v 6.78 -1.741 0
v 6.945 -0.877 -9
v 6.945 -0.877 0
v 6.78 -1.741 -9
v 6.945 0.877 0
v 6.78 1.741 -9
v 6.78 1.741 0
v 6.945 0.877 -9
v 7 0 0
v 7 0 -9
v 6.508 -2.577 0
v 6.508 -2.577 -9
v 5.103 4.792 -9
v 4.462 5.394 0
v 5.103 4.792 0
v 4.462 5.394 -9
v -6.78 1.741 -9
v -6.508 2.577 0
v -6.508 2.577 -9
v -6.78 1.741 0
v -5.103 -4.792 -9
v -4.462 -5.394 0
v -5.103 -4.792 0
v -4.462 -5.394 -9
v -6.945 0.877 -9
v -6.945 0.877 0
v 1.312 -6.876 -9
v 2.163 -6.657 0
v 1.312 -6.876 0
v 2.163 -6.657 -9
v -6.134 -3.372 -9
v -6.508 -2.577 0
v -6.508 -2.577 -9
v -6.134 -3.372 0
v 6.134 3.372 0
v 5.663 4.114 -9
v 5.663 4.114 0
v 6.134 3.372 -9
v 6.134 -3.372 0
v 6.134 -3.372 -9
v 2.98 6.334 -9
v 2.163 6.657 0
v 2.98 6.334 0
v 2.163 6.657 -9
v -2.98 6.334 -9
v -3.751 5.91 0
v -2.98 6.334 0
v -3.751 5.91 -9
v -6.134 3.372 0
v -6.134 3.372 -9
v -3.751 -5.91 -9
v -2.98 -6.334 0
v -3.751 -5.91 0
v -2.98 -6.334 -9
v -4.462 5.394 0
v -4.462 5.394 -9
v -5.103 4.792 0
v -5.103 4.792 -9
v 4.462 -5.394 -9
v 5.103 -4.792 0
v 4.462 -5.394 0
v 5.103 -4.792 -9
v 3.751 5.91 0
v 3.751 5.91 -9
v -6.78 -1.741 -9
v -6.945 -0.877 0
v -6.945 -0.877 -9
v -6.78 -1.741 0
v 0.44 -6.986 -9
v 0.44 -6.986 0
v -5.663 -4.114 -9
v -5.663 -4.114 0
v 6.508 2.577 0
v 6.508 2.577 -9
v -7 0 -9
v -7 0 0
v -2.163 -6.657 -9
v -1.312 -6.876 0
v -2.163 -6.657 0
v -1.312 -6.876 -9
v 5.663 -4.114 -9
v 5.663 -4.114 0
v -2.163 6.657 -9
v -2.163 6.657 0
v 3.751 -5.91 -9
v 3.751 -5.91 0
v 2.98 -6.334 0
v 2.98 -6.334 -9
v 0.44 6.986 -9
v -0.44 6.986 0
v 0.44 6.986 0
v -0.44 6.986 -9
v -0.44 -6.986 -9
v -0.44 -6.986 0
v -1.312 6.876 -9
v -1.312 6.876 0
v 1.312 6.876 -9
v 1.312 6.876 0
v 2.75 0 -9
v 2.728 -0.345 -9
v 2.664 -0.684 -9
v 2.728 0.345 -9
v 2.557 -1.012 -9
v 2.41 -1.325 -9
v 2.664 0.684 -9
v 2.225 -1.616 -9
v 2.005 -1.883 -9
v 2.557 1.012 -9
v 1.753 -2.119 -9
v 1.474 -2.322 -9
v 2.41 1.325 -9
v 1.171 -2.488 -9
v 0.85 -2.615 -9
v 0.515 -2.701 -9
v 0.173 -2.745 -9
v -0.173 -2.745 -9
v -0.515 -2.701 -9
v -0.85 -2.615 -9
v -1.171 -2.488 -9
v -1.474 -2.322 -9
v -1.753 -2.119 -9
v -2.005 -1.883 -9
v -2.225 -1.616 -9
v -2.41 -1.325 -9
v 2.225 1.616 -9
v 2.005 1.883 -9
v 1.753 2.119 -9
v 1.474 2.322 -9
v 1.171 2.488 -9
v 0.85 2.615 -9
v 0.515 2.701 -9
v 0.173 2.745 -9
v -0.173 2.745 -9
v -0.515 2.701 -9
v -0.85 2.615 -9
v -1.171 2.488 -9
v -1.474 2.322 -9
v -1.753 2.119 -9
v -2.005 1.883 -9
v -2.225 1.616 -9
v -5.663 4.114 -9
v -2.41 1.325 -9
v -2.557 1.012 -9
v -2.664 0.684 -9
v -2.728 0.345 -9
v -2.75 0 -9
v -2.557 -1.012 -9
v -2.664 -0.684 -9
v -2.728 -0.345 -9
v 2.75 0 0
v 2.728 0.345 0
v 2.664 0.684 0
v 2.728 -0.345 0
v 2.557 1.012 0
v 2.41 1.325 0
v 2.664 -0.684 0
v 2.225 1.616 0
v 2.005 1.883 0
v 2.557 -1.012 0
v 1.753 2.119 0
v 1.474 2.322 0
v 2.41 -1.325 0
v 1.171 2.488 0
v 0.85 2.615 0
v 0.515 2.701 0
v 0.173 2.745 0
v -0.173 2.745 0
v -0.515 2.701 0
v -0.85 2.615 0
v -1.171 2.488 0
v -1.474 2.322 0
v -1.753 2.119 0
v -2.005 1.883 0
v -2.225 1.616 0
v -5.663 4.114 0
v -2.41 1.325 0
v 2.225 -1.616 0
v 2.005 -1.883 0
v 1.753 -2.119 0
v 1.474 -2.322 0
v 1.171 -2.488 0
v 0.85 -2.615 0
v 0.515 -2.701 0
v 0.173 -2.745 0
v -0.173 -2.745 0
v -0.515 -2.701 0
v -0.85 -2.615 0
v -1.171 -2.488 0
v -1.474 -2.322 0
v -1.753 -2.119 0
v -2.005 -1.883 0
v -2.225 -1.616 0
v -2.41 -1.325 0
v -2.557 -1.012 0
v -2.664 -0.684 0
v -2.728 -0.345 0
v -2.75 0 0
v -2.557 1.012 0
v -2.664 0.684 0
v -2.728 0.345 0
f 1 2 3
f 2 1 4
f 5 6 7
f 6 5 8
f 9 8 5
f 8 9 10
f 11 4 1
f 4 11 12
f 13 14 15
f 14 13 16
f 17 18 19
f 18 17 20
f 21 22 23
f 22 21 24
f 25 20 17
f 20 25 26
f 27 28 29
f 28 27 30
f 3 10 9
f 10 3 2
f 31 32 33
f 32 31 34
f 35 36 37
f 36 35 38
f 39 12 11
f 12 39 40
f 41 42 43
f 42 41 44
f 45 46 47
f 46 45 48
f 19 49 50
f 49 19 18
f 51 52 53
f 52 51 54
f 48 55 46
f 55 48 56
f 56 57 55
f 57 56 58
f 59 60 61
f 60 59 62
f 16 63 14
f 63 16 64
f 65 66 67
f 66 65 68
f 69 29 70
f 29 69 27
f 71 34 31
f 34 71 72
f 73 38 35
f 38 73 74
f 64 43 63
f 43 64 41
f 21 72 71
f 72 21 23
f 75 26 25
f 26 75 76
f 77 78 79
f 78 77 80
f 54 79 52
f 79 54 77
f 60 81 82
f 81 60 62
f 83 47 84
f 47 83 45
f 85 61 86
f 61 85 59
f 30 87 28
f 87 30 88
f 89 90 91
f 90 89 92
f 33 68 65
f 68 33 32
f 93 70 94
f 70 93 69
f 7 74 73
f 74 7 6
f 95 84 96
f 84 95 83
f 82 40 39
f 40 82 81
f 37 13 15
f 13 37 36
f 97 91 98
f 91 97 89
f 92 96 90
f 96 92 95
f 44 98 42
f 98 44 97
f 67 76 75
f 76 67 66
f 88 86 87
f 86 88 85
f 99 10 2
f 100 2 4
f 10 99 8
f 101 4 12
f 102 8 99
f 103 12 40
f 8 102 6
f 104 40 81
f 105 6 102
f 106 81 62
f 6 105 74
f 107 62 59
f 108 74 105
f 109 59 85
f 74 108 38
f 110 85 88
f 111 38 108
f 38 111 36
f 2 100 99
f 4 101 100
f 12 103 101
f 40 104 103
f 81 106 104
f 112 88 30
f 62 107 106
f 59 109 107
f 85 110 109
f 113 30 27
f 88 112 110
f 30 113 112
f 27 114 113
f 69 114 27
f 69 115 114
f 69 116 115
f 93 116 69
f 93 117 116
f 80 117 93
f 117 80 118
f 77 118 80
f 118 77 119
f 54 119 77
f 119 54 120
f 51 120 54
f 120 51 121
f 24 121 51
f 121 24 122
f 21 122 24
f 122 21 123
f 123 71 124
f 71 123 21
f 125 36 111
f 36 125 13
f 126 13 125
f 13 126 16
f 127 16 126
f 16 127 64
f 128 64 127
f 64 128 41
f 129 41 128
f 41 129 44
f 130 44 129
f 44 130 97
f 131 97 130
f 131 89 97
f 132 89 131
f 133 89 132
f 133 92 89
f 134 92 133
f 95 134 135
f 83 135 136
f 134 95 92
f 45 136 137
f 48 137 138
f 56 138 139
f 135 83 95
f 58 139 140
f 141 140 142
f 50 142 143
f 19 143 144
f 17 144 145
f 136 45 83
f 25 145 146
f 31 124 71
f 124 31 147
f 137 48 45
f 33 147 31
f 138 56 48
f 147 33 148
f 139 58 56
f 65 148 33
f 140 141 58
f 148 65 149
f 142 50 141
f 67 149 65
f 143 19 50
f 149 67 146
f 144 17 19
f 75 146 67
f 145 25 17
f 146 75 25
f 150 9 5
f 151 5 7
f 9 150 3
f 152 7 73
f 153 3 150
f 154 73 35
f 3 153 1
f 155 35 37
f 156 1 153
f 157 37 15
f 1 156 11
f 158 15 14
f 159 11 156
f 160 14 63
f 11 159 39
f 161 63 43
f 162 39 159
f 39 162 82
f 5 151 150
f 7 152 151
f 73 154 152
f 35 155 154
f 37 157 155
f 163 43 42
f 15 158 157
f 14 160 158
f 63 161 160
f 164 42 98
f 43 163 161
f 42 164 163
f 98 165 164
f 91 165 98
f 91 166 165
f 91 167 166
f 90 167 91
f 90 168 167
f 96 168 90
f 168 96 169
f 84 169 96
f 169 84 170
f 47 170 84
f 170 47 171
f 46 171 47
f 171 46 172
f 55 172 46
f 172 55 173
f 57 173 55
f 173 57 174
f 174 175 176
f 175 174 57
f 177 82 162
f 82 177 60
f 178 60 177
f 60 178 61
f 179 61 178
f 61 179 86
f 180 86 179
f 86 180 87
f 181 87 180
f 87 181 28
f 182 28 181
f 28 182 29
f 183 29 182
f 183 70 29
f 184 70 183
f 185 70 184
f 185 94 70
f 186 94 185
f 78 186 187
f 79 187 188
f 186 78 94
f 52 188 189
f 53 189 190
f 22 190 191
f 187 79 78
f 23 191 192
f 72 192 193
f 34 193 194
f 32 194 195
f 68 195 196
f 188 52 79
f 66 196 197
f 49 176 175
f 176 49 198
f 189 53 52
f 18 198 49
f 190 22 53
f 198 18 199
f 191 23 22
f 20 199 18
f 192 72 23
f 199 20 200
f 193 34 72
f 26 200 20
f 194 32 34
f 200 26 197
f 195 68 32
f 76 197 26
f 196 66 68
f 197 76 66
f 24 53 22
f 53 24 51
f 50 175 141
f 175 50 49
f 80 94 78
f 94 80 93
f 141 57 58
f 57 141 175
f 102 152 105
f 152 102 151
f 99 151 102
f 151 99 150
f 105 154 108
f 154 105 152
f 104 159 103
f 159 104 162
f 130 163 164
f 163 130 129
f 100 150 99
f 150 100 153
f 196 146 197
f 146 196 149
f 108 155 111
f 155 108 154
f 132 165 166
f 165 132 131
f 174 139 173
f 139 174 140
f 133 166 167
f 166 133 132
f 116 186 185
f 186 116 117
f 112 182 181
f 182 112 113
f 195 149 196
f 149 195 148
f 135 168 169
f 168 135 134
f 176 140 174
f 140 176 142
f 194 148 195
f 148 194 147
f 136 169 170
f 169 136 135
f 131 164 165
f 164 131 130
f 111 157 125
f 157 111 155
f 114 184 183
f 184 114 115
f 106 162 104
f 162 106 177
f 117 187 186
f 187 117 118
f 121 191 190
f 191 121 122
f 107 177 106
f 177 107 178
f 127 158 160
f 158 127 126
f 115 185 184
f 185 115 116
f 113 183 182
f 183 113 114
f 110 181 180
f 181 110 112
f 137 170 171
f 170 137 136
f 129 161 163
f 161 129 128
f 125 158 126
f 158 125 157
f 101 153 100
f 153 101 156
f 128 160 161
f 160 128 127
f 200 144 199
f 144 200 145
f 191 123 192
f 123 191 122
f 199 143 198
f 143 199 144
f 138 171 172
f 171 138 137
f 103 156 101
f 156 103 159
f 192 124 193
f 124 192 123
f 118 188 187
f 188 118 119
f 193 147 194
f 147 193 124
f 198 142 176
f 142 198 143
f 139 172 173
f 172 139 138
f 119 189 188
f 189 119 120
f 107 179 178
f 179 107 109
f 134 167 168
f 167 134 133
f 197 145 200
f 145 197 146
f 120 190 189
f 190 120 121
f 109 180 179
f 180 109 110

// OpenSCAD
$fn = 50;


difference() {
	union() {
		translate(v = [0, 0, -9.0000000000]) {
			cylinder(h = 9, r = 7.0000000000);
		}
	}
	union() {
		#translate(v = [0, 0, -9]) {
			cylinder(h = 9, r = 2.7500000000);
		}
	}
}
